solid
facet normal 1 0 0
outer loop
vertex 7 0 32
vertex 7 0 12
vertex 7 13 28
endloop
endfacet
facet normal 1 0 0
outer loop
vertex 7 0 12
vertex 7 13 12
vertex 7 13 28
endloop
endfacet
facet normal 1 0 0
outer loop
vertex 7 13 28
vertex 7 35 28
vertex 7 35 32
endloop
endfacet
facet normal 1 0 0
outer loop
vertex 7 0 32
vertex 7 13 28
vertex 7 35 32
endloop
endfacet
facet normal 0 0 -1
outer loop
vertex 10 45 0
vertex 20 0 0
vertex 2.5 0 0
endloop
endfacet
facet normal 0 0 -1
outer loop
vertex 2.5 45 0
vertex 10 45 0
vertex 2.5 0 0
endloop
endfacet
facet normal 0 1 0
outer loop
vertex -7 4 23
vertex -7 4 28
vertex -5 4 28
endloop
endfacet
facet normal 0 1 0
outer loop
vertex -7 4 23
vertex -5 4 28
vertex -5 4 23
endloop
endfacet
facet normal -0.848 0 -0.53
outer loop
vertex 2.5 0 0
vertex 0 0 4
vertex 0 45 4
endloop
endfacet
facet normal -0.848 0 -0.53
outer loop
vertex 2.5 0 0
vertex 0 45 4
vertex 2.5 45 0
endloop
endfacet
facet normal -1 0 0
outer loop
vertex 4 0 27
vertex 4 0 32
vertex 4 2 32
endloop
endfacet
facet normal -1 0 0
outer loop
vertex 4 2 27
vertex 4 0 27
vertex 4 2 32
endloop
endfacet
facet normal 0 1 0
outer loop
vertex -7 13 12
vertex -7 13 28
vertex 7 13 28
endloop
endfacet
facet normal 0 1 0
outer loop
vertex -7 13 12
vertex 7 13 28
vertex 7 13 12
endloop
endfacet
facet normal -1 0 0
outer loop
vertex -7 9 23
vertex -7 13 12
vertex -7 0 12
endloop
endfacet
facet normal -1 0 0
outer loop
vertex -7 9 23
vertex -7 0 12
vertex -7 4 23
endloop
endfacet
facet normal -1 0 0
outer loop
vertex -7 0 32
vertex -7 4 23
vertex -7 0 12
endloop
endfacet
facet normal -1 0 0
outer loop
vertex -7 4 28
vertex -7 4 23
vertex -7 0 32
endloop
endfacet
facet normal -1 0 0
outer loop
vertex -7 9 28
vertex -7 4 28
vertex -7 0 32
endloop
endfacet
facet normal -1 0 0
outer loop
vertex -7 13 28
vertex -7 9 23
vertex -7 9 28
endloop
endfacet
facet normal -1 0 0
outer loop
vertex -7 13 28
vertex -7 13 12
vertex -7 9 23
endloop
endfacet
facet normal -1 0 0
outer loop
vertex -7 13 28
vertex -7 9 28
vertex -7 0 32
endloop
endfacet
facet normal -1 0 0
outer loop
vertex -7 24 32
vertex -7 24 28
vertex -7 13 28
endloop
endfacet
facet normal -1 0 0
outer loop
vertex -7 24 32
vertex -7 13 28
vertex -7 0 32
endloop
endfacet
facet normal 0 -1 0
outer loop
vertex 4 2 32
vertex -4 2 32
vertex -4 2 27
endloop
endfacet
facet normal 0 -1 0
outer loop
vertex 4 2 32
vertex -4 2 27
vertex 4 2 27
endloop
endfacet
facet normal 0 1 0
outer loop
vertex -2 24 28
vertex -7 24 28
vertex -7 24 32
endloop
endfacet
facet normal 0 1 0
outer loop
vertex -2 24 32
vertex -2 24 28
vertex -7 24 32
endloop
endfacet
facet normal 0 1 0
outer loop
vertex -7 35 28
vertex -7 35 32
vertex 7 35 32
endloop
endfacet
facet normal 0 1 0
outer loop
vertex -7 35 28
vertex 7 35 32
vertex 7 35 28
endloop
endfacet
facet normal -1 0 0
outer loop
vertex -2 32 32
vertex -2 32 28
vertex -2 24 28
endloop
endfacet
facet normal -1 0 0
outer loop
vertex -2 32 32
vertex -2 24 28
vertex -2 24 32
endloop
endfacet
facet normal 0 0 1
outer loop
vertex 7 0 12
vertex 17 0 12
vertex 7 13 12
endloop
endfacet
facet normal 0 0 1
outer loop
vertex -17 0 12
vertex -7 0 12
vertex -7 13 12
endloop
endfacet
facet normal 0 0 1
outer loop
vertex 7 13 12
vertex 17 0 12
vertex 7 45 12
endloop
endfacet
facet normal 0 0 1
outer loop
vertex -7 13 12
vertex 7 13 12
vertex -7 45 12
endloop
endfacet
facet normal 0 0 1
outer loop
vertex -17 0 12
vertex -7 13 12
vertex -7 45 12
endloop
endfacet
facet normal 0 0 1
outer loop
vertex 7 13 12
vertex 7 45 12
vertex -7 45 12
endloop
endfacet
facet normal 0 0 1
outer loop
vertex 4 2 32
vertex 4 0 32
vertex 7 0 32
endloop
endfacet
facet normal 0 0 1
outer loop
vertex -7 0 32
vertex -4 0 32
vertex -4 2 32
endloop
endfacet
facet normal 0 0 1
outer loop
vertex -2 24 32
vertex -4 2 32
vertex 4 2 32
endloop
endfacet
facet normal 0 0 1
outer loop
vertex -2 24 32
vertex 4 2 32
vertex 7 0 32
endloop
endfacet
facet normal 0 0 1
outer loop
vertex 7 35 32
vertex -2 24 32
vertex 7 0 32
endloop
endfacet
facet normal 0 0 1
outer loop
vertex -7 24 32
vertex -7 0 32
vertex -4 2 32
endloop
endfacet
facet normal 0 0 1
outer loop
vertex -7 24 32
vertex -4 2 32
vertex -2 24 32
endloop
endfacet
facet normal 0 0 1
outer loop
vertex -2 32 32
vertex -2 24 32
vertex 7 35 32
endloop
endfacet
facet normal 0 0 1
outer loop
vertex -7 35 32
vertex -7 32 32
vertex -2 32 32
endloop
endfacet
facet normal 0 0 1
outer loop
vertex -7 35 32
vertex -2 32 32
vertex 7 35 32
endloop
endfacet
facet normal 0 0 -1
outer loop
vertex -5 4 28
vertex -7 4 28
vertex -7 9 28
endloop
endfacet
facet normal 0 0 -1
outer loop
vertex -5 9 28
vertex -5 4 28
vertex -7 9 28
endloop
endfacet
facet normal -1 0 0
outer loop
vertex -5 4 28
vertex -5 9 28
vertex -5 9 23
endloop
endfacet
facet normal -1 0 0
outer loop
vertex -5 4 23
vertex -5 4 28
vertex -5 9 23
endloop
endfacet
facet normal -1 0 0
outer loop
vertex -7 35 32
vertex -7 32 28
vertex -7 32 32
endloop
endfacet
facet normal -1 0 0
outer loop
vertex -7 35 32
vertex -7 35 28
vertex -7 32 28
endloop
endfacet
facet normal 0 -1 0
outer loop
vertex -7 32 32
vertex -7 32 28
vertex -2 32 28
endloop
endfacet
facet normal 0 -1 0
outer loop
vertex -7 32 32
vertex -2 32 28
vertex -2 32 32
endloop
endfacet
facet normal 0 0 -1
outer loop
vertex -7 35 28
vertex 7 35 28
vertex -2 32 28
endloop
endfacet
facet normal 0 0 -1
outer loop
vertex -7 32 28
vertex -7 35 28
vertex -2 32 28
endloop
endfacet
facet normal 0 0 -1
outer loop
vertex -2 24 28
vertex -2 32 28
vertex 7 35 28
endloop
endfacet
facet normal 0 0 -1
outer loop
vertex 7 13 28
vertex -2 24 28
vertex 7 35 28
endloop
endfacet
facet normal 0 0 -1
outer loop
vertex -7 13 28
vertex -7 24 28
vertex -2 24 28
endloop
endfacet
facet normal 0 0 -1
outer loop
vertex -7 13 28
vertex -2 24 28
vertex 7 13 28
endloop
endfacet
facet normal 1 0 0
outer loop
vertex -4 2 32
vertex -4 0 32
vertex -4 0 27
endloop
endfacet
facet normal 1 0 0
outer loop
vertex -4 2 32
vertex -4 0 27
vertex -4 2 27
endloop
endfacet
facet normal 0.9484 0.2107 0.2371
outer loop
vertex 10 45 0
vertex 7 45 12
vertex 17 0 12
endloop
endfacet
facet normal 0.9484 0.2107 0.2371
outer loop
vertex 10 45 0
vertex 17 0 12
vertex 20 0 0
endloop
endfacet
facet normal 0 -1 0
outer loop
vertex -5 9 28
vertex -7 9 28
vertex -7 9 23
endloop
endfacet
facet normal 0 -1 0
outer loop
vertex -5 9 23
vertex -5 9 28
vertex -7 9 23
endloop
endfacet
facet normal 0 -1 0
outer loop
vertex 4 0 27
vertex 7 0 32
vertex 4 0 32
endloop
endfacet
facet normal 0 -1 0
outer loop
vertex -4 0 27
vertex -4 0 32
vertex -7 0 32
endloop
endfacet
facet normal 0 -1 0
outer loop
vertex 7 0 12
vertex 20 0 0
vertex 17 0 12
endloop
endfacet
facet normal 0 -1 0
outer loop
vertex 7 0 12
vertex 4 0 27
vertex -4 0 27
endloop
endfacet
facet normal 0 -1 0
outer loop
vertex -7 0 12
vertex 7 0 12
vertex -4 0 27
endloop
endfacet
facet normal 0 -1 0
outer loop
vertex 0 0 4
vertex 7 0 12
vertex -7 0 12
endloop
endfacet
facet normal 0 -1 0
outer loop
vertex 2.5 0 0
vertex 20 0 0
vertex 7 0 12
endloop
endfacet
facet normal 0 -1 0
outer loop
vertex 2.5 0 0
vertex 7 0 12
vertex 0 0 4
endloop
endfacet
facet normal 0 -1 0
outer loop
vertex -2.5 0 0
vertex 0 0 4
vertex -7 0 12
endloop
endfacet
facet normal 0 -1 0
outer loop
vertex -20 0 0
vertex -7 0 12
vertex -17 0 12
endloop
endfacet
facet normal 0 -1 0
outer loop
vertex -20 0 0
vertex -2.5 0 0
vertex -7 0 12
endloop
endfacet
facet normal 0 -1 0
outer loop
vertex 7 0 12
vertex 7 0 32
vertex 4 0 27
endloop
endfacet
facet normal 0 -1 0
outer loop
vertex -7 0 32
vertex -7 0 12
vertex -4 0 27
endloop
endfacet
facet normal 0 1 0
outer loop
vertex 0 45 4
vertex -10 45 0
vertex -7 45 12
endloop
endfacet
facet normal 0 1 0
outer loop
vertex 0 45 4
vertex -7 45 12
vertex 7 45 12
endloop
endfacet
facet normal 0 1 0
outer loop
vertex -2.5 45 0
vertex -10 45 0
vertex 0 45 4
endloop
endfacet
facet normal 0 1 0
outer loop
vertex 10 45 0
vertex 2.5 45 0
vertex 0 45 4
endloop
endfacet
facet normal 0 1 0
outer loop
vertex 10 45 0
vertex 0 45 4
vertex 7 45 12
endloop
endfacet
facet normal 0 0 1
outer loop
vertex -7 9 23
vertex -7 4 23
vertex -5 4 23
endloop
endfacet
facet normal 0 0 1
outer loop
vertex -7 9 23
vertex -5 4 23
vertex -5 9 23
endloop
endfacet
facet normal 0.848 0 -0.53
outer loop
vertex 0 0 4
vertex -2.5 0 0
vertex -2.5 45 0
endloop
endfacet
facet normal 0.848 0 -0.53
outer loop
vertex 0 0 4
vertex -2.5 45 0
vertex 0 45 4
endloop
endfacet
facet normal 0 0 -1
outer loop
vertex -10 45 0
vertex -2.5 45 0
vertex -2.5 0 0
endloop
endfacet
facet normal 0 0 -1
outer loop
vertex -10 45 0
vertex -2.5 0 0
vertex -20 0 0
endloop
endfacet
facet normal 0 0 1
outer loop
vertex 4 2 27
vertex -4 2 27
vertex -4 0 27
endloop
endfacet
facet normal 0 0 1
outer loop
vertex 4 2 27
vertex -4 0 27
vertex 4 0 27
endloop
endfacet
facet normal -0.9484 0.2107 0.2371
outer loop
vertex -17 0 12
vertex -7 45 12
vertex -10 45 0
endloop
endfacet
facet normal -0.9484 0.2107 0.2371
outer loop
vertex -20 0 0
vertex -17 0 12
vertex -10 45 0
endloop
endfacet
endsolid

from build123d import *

# Parameters (mm, degrees)
EXTRUDE_1_DEPTH      = 12
CUT_EXTRUDE_1_DEPTH  = 52.946106026
CUT_EXTRUDE_2_DEPTH  = 52.946106026
CUT_EXTRUDE_3_DEPTH  = 51.68530359
EXTRUDE_2_DEPTH      = 7
EXTRUDE_2_DEPTH_BACK = 7
SKETCH_6_W           = 8
SKETCH_6_H           = 2
CUT_EXTRUDE_4_DEPTH  = 5
SKETCH_7_W           = 4
SKETCH_7_H           = 8
CUT_EXTRUDE_5_DEPTH  = 5
SKETCH_8_W           = 5
SKETCH_8_H           = 5
CUT_EXTRUDE_6_DEPTH  = 2


with BuildPart() as part:
    # Эскиз1 → Бобышка-Вытянуть1 (new body)
    with BuildSketch(Plane.XY):
        Polygon((-10, 45), (10, 45), (20, 0), (-20, 0), align=None)
    extrude(amount=EXTRUDE_1_DEPTH)

    # Эскиз2 → Вырез-Вытянуть1 (cut, through all, along a direction that is not the sketch's normal)
    with BuildSketch(Plane.XZ):
        Polygon((-20, 0), (-20, 12), (-17, 12), align=None)
    extrude(amount=-CUT_EXTRUDE_1_DEPTH, dir=(-0.21693045781865616, -0.9761870601839528, 0), mode=Mode.SUBTRACT)

    # Эскиз3 → Вырез-Вытянуть2 (cut, through all, along a direction that is not the sketch's normal)
    with BuildSketch(Plane.XZ):
        Polygon((20, 0), (20, 12), (17, 12), align=None)
    extrude(amount=-CUT_EXTRUDE_2_DEPTH, dir=(0.21693045781865616, -0.9761870601839528, 0), mode=Mode.SUBTRACT)

    # Эскиз4 → Вырез-Вытянуть3 (cut, through all)
    with BuildSketch(Plane(origin=(0, 45, 0), x_dir=(1, 0, 0), z_dir=(0, 1, 0))):
        Polygon((0, 0), (-2.5, 0), (0, -4), (2.5, 0), align=None)
    extrude(amount=-CUT_EXTRUDE_3_DEPTH, mode=Mode.SUBTRACT)

    # Эскиз5 → Бобышка-Вытянуть2 (add, two sides: drawn at the far end of the back side and taken through both)
    with BuildSketch(Plane(origin=(0, 0, 0), x_dir=(0, 0, -1), z_dir=(1, 0, 0)).offset(-EXTRUDE_2_DEPTH_BACK)):
        Polygon((-12, 0), (-32, 0), (-32, 35), (-28, 35), (-28, 13), (-12, 13), align=None)
    extrude(amount=EXTRUDE_2_DEPTH + EXTRUDE_2_DEPTH_BACK)

    # Эскиз6 → Вырез-Вытянуть4 (cut)
    with BuildSketch(Plane.XY.offset(32)):
        with Locations((0, 1)):
            Rectangle(SKETCH_6_W, SKETCH_6_H)
    extrude(amount=-CUT_EXTRUDE_4_DEPTH, mode=Mode.SUBTRACT)

    # Эскиз7 → Вырез-Вытянуть5 (cut)
    with BuildSketch(Plane.ZY.offset(7)):
        with Locations((30, 28)):
            Rectangle(SKETCH_7_W, SKETCH_7_H)
    extrude(amount=-CUT_EXTRUDE_5_DEPTH, mode=Mode.SUBTRACT)

    # Эскиз8 → Вырез-Вытянуть6 (cut)
    with BuildSketch(Plane(origin=(-7, 0, 0), x_dir=(0, 0, -1), z_dir=(1, 0, 0))):
        with Locations((-25.5, 6.5)):
            Rectangle(SKETCH_8_W, SKETCH_8_H)
    extrude(amount=CUT_EXTRUDE_6_DEPTH, mode=Mode.SUBTRACT)


solid = part.part
